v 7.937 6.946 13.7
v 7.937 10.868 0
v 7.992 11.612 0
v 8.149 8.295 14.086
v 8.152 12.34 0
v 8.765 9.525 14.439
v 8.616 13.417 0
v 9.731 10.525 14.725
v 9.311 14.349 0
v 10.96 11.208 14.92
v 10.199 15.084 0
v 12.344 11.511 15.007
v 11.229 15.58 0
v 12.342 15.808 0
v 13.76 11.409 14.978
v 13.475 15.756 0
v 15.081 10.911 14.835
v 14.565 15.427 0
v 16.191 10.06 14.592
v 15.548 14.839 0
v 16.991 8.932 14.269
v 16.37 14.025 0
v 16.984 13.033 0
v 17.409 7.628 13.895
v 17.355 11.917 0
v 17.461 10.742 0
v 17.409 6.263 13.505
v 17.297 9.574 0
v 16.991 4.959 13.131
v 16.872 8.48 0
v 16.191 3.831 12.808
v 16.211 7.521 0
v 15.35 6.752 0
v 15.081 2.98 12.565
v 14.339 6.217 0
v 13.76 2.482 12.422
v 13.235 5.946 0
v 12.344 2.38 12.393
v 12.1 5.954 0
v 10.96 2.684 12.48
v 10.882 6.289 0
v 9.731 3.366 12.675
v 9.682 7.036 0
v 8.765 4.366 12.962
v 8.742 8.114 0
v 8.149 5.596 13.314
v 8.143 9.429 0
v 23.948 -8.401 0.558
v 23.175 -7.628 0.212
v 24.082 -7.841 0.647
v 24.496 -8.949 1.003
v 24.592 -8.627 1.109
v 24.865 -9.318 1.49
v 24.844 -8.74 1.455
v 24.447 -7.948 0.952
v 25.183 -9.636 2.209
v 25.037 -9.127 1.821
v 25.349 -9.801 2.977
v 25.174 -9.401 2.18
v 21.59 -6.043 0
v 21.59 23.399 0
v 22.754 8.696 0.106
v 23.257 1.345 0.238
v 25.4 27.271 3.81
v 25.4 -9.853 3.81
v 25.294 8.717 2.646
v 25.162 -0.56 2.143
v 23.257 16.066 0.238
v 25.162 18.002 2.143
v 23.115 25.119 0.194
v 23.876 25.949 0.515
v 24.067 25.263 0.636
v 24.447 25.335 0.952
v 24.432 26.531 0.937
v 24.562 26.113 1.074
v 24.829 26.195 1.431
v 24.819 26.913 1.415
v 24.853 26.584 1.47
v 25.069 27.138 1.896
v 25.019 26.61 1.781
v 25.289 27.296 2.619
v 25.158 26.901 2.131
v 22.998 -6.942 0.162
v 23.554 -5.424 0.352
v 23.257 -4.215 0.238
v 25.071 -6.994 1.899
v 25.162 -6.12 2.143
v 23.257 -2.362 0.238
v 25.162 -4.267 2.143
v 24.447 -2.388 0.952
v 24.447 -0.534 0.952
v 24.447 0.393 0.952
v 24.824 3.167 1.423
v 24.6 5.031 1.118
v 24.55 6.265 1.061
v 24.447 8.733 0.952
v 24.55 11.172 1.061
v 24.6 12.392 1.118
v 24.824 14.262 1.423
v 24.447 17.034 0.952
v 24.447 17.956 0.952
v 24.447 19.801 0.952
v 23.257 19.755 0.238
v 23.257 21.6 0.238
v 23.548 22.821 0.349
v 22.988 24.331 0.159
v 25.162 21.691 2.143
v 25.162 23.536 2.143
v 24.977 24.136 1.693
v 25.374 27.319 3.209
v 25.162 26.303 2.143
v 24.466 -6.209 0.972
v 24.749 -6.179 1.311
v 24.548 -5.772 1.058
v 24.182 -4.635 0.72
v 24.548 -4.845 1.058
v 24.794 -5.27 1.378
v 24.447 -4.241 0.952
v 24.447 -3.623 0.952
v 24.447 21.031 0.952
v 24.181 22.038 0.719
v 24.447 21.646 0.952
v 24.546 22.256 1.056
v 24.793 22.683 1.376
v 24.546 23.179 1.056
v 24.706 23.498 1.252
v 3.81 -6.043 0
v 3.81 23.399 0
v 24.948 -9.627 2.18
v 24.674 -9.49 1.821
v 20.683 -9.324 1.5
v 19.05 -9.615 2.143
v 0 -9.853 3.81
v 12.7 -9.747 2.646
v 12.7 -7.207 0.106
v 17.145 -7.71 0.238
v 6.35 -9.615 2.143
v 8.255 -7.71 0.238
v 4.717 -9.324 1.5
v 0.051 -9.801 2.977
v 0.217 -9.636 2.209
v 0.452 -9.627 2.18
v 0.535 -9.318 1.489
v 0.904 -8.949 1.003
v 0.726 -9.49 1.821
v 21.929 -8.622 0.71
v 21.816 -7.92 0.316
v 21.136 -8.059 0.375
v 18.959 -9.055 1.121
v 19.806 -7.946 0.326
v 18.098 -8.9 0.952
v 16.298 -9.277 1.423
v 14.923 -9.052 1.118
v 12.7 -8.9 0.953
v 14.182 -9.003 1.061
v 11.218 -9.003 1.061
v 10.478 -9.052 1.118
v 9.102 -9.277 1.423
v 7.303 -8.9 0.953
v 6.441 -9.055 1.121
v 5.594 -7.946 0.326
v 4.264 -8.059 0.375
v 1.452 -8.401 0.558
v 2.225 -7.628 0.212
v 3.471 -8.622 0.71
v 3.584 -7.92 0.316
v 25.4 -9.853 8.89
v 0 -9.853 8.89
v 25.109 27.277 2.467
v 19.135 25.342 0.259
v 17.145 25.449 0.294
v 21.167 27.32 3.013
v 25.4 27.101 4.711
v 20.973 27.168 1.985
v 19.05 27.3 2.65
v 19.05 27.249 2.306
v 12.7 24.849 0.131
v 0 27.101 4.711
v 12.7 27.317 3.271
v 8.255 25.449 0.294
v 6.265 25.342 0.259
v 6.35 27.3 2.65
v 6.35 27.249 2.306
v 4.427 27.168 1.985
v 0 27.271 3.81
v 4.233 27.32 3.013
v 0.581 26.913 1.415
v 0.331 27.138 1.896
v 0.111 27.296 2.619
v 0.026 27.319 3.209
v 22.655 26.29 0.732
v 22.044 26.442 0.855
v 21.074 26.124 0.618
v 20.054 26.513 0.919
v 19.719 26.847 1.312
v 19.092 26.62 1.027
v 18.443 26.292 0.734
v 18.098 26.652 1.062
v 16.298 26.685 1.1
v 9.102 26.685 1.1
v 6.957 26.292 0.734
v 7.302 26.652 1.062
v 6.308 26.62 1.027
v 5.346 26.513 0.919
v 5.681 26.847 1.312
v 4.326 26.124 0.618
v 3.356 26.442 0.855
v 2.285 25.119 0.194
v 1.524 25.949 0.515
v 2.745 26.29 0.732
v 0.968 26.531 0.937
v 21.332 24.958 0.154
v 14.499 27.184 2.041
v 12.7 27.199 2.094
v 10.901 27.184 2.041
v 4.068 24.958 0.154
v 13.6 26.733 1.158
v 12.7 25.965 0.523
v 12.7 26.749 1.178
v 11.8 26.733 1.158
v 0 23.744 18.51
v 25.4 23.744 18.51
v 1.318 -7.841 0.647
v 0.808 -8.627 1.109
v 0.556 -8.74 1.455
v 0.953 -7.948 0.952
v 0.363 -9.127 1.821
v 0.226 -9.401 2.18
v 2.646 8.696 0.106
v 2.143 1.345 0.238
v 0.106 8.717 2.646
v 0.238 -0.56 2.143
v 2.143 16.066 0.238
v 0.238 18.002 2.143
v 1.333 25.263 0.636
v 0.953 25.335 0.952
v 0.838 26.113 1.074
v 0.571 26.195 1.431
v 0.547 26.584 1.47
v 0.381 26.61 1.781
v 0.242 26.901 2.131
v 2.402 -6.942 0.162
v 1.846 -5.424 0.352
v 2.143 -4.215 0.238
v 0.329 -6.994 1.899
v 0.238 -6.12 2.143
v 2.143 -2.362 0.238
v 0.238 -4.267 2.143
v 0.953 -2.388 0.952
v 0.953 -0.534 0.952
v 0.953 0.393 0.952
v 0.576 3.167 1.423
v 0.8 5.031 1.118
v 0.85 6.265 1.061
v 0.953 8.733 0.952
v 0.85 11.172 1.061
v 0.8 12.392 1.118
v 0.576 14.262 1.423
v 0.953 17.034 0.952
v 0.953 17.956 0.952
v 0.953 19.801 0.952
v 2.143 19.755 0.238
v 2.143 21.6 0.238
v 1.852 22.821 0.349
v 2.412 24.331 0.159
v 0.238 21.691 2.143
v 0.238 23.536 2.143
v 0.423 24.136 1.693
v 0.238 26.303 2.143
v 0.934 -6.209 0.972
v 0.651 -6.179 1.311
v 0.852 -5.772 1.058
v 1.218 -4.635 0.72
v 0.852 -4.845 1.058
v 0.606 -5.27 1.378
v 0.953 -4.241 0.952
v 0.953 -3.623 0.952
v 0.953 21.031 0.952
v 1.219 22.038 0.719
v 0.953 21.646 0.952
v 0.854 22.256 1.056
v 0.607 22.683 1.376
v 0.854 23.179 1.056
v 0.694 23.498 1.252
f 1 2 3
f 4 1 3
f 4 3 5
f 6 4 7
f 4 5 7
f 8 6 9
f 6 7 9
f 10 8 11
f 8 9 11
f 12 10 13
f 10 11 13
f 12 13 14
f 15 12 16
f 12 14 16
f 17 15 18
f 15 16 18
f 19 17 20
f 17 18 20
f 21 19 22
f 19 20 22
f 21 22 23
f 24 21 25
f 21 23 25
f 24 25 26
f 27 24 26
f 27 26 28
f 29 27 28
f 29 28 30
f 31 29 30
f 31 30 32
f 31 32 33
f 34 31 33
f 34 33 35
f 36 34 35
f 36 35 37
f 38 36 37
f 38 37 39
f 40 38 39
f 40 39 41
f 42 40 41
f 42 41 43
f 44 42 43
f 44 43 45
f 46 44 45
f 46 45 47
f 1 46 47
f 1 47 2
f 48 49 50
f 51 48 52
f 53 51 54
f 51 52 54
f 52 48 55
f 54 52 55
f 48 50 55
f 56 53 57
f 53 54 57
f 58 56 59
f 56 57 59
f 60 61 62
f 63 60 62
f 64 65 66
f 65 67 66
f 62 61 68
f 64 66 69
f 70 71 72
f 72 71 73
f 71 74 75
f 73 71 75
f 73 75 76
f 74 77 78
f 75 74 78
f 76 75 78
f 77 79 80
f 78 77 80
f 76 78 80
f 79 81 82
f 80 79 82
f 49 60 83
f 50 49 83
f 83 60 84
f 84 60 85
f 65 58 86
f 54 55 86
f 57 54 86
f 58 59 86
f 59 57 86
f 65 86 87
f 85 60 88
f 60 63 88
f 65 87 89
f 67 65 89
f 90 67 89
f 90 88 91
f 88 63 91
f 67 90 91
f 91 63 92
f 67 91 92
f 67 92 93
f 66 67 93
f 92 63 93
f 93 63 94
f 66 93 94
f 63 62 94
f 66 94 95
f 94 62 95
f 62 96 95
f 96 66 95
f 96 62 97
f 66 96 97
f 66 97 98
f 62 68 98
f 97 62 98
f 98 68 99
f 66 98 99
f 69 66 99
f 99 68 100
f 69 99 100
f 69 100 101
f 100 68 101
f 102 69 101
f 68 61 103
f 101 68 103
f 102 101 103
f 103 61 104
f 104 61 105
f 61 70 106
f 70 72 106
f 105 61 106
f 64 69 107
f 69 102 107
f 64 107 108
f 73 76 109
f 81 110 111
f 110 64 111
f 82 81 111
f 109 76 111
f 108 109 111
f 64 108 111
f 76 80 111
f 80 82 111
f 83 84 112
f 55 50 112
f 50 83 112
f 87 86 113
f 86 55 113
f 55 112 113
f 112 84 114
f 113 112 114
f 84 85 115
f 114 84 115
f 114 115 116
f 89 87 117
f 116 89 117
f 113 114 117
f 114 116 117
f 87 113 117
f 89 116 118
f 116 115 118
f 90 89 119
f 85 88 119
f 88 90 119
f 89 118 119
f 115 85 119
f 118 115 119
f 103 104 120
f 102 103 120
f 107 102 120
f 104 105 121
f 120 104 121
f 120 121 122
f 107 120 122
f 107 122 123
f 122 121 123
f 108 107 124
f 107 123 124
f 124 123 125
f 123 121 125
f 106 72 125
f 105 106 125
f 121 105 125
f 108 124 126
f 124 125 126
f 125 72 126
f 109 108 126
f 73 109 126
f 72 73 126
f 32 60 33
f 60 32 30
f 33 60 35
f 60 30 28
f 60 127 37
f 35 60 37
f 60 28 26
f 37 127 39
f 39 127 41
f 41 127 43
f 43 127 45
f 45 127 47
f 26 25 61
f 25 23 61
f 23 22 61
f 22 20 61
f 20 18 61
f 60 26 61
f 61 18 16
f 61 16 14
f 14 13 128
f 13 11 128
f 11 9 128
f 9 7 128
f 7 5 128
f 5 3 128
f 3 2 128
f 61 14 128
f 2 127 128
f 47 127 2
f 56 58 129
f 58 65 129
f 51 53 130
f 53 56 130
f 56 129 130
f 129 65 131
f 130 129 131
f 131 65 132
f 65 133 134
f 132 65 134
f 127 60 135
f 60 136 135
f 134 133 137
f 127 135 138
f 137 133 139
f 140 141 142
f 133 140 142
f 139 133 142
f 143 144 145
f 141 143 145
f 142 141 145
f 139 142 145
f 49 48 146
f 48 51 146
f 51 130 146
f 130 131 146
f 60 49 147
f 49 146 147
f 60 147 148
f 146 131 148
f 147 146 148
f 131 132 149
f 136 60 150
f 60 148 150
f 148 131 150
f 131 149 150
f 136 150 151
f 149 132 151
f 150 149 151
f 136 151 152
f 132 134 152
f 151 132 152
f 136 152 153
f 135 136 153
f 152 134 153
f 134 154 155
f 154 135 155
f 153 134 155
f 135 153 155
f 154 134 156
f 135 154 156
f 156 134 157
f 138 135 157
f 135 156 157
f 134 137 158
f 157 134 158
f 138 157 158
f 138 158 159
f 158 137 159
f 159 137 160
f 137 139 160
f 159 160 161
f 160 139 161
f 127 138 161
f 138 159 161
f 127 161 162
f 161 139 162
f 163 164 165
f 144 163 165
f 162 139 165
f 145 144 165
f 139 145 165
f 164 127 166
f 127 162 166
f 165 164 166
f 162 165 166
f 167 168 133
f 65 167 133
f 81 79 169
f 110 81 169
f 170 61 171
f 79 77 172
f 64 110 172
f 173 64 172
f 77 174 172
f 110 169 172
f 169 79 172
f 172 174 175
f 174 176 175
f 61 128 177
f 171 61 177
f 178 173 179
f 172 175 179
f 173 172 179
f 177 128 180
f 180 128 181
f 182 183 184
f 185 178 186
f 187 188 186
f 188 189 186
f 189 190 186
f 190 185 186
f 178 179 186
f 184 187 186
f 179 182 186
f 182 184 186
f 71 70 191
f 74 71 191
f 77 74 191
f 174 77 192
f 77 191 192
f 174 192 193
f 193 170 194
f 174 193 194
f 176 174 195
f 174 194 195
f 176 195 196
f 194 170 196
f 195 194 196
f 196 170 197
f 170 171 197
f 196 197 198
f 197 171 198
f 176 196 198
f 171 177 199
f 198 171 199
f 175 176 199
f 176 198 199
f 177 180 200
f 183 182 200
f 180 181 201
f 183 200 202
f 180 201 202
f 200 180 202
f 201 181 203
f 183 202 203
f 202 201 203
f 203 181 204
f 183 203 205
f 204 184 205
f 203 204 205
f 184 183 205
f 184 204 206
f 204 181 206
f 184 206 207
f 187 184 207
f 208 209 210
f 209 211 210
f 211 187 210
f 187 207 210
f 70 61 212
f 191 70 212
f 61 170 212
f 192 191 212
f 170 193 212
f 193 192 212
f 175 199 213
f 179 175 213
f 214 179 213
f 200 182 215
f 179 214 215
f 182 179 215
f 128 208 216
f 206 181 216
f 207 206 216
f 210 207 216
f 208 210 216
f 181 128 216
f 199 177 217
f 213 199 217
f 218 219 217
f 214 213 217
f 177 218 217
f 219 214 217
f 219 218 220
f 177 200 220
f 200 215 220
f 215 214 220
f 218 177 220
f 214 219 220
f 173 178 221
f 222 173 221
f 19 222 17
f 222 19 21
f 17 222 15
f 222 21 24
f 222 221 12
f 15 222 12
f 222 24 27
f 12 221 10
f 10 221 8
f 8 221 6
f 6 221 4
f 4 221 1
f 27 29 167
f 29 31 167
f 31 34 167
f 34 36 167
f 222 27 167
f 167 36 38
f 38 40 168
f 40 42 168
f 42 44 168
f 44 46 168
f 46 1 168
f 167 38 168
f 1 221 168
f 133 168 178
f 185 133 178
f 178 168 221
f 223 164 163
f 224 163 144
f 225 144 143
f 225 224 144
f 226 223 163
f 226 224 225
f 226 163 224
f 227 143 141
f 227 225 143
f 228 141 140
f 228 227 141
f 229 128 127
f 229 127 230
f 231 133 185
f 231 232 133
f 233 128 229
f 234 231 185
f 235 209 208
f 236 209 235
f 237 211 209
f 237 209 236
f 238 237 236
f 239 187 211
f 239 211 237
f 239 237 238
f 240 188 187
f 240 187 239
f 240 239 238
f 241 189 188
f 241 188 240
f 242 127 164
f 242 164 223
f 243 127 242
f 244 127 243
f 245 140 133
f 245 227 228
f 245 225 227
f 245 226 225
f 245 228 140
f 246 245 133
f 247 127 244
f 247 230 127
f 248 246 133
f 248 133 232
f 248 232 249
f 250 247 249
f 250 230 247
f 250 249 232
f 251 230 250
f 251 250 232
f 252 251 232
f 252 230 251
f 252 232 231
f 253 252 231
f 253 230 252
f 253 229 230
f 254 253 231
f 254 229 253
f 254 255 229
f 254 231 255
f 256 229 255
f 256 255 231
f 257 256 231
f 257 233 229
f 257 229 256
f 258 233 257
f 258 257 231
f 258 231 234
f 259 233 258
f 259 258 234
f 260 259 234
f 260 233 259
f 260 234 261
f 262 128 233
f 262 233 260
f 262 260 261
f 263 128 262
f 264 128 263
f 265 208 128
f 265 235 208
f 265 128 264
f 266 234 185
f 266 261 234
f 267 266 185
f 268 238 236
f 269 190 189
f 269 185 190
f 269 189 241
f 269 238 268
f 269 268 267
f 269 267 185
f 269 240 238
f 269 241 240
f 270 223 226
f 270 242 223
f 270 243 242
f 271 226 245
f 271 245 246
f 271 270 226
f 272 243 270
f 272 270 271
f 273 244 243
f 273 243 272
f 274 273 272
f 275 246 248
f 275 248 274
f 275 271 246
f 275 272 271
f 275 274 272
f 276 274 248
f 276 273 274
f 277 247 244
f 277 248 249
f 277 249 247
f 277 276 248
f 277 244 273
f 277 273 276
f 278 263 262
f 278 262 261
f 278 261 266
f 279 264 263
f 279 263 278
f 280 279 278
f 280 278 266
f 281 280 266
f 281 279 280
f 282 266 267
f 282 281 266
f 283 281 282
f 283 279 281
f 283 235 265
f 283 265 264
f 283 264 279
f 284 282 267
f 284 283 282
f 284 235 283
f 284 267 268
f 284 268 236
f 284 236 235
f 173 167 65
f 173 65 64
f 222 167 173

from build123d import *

# Parameters (mm, degrees)
F1_DEPTH    = 25.4
F3_T1_DEPTH = 49.6403917904
F3_T3_DEPTH = 57.15
F3_T5_DEPTH = 44.45
F4_D        = 9.525


# Not quite as in the source:
# - a fillet or chamfer that OpenCascade refuses, or shapes differently, is made with other operations: its cross-section is extruded or revolved along the edge and cut away or added


with BuildPart() as f1:
    # F0 (on Right) → F1 (new body)
    with BuildSketch(Plane.YZ):
        Polygon((28.2472143829, 0), (23.7438723809, 18.5100624206), (-9.8527856171, 8.89), (-9.8527856171, 0), align=None)
    extrude(amount=F1_DEPTH)

    # F3: fillet of radius 3.81 on 4 edges, made by hand

    # F3_s2 → F3_t1 (cut)
    with BuildSketch(Plane.YZ.offset(-12.1201958952)):
        with BuildLine():
            add(Edge.make_bspline(
                [(23.3991360248, 0), (28.2472143829, 0), (27.1011485089, 4.7106684004)],
                knots=[0, 0, 0, 1, 1, 1], degree=2, weights=[1, 1, 1]))
            Line((27.1011485089, 4.7106684004), (28.2472143829, 0))
            Line((28.2472143829, 0), (23.3991360248, 0))
        make_face()
    extrude(amount=F3_T1_DEPTH, mode=Mode.SUBTRACT)

    # F3_s4 → F3_t3 (cut)
    with BuildSketch(Plane.XZ.offset(-37.7722143829)):
        with BuildLine():
            add(Edge.make_bspline(
                [(3.81, 0), (0, 0), (0, 3.81)],
                knots=[0, 0, 0, 1, 1, 1], degree=2, weights=[1, 1, 1]))
            Line((0, 3.81), (0, 0))
            Line((0, 0), (3.81, 0))
        make_face()
        with BuildLine():
            add(Edge.make_bspline(
                [(21.59, 0), (25.4, 0), (25.4, 3.81)],
                knots=[0, 0, 0, 1, 1, 1], degree=2, weights=[1, 1, 1]))
            Line((25.4, 3.81), (25.4, 0))
            Line((25.4, 0), (21.59, 0))
        make_face()
    extrude(amount=F3_T3_DEPTH, mode=Mode.SUBTRACT)

    # F3_s6 → F3_t5 (cut)
    with BuildSketch(Plane.YZ.offset(-9.525)):
        with BuildLine():
            add(Edge.make_bspline(
                [(-9.8527856171, 3.81), (-9.8527856171, 0), (-6.0427856171, 0)],
                knots=[0, 0, 0, 1, 1, 1], degree=2, weights=[1, 1, 1]))
            Line((-6.0427856171, 0), (-9.8527856171, 0))
            Line((-9.8527856171, 0), (-9.8527856171, 3.81))
        make_face()
    extrude(amount=F3_T5_DEPTH, mode=Mode.SUBTRACT)

    # F4 (through all)
    with Locations(Plane(origin=(0, -3.0992844266, 10.8237966001), x_dir=(1, 0, 0), z_dir=(0, -0.2752771, 0.9613649246))):
        with Locations((12.7, 10.448506651)):
            Hole(F4_D / 2)


solid = f1.part
